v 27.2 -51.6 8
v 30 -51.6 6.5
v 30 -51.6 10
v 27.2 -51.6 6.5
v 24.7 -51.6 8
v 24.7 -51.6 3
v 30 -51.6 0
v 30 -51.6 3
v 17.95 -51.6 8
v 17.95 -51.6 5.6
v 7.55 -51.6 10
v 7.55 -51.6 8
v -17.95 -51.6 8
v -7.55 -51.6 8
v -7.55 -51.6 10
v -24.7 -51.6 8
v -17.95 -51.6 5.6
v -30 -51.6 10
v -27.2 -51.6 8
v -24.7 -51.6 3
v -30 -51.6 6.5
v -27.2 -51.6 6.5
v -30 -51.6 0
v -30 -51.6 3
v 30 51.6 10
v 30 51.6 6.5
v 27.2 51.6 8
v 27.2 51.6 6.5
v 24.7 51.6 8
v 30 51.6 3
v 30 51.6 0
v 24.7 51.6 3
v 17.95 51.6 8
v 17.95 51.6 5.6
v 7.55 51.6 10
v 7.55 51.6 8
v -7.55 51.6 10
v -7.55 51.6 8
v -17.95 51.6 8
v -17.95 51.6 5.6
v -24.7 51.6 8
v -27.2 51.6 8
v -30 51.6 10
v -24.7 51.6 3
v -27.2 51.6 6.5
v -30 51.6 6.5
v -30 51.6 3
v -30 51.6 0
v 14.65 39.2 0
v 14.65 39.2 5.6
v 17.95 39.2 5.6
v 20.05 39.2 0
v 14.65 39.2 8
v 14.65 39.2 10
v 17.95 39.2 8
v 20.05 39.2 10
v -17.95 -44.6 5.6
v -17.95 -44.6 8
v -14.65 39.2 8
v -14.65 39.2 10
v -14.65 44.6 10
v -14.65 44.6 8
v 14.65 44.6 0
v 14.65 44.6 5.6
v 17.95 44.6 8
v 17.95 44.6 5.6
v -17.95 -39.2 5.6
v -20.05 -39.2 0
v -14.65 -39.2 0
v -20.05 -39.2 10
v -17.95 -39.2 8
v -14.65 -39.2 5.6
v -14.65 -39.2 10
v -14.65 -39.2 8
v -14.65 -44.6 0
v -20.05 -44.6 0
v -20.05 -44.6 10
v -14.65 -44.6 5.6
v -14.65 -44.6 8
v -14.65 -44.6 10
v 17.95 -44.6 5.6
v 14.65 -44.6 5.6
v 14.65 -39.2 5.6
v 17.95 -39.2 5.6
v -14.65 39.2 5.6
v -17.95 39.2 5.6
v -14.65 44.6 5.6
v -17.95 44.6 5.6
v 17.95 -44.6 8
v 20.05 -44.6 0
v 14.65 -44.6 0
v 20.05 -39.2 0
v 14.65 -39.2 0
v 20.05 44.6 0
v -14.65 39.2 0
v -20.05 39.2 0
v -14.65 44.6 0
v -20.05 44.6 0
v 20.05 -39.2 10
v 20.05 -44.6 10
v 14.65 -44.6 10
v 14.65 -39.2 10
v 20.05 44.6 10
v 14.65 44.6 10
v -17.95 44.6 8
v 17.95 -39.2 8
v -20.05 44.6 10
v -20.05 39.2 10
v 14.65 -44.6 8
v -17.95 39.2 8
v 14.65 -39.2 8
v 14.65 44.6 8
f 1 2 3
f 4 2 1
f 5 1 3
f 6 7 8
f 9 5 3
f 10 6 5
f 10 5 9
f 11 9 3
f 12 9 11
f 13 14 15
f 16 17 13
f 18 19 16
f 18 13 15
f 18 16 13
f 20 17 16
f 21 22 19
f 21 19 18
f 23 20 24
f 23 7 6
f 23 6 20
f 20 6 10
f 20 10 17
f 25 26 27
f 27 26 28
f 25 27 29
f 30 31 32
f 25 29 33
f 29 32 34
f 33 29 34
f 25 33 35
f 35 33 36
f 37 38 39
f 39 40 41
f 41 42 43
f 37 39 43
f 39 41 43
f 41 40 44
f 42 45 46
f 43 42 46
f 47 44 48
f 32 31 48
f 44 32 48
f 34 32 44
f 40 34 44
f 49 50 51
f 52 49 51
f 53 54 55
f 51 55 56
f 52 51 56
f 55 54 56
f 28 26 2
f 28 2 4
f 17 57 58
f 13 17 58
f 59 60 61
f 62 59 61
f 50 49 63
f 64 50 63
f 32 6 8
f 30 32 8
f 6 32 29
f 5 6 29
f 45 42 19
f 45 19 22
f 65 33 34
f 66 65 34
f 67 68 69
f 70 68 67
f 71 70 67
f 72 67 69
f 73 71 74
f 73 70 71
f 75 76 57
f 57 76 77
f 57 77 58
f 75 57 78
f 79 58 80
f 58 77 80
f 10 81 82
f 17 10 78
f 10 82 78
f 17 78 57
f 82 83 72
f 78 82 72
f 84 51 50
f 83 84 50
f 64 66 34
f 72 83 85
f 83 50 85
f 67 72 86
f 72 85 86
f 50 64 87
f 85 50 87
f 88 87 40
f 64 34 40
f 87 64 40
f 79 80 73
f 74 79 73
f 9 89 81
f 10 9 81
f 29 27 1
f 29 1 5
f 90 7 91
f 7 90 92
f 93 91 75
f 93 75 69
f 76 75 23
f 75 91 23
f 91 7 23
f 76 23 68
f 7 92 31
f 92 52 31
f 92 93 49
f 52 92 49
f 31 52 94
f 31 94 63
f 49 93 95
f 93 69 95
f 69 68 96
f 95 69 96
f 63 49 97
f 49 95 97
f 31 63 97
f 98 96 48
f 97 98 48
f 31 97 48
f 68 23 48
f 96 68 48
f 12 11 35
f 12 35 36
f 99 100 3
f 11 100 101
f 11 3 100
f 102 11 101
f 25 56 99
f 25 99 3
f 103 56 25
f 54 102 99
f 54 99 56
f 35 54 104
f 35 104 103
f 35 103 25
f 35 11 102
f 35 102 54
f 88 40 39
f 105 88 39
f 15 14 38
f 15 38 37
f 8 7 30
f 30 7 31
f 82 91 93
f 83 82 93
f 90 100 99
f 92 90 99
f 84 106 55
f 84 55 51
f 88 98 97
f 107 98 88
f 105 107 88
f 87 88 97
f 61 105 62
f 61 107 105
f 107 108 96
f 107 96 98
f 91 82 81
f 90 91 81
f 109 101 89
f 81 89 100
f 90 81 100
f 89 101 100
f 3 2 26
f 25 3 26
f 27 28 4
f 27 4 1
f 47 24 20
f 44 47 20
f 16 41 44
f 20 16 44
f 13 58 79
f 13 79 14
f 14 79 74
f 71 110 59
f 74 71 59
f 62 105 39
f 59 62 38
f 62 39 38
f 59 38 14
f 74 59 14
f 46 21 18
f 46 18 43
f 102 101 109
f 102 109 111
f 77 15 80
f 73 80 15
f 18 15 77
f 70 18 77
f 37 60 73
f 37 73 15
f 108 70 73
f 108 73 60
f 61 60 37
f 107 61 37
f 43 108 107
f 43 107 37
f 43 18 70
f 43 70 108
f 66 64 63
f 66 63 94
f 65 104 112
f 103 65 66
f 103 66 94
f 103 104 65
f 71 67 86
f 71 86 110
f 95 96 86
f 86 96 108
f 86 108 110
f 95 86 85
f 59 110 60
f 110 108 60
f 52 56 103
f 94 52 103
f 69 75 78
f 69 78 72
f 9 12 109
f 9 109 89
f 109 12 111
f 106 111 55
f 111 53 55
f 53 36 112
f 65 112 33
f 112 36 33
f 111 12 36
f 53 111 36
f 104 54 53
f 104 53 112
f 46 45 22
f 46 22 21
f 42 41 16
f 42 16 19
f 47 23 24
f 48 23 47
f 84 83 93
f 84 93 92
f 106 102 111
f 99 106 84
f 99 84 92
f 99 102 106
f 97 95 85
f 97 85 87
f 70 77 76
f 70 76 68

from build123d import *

# Parameters (mm, degrees)
SKETCH1_W           = 103.2
SKETCH1_H           = 60
BOSS_EXTRUDE1_DEPTH = 10
CUT_EXTRUDE6_DEPTH  = 108.936277497
SKETCH16_W          = 5.4
SKETCH16_H          = 5.4
CUT_EXTRUDE7_DEPTH  = 61.519087898


with BuildPart() as part:
    # Sketch1 → Boss-Extrude1 (new body)
    with BuildSketch(Plane(origin=(0, 0, 0), x_dir=(0, 1, 0), z_dir=(0, 0, 1))):
        Rectangle(SKETCH1_W, SKETCH1_H)
    extrude(amount=BOSS_EXTRUDE1_DEPTH)

    # Sketch14 → Cut-Extrude6 (cut, through all)
    with BuildSketch(Plane(origin=(0, 51.6, 0), x_dir=(-1, 0, 0), z_dir=(0, 1, 0))):
        Polygon((-30, 6.5), (-27.2, 6.5), (-27.2, 8), (-24.7, 8), (-24.7, 6), (-24.7, 3), (-30, 3), align=None)
        Polygon((30, 6.5), (30, 3), (24.7, 3), (24.7, 6), (24.7, 8), (27.2, 8), (27.2, 6.5), align=None)
        Polygon((17.95, 8), (7.55, 8), (7.55, 10), (-7.55, 10), (-7.55, 8), (-17.95, 8), (-17.95, 5.6), (17.95, 5.6), align=None)
    extrude(amount=-CUT_EXTRUDE6_DEPTH, mode=Mode.SUBTRACT)

    # Sketch16 → Cut-Extrude7 (cut, through all)
    with BuildSketch(Plane.XY.offset(10)):
        with Locations((17.35, -41.9)):
            Rectangle(SKETCH16_W, SKETCH16_H)
        with Locations((17.35, 41.9)):
            Rectangle(SKETCH16_W, SKETCH16_H)
        with Locations((-17.35, 41.9)):
            Rectangle(SKETCH16_W, SKETCH16_H)
        with Locations((-17.35, -41.9)):
            Rectangle(SKETCH16_W, SKETCH16_H)
    extrude(amount=-CUT_EXTRUDE7_DEPTH, mode=Mode.SUBTRACT)


solid = part.part
